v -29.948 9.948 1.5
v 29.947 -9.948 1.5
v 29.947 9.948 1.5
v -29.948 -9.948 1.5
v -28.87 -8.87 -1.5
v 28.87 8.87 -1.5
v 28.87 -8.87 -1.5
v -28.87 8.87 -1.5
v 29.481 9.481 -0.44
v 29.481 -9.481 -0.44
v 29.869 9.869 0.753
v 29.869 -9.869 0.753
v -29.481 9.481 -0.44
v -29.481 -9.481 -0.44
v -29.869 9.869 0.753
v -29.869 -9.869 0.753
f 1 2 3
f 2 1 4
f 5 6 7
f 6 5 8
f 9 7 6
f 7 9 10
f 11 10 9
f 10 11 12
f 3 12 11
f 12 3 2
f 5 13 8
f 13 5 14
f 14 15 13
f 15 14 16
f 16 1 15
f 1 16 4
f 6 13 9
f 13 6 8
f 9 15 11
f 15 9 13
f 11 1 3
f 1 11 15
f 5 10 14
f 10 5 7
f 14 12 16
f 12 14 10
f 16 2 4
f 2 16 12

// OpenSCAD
use <MCAD/boxes.scad>

// cylinder(r=5,h=30,center=true,$fn=30);
module trim()
{
	translate([-5,0,0])
	difference()
	{
		cube([10,100,3],center=true);

		translate([5-6,0,0+2])
			rotate([90,0,0])
				cylinder(r=6,h=110,center=true,$fn=30);
	}
}

module face(w,h,d)
{
	smudge=0.0001;

	difference()
	{
		cube([w,h,d],center=true);
		translate([w/2,0,0])
			trim();
		translate([-(w/2+smudge),0,0])
			rotate([0,0,180])
				trim();
		translate([0,(h/2+smudge),0])
			rotate([0,0,90])
				trim();
		translate([0,-(h/2+smudge),0])
			rotate([0,0,270])
				trim();
	}
}

// scale([.2,.2,.2])
// roundedBox([100, 200, 100], 10, false);
face(60,20,3);
